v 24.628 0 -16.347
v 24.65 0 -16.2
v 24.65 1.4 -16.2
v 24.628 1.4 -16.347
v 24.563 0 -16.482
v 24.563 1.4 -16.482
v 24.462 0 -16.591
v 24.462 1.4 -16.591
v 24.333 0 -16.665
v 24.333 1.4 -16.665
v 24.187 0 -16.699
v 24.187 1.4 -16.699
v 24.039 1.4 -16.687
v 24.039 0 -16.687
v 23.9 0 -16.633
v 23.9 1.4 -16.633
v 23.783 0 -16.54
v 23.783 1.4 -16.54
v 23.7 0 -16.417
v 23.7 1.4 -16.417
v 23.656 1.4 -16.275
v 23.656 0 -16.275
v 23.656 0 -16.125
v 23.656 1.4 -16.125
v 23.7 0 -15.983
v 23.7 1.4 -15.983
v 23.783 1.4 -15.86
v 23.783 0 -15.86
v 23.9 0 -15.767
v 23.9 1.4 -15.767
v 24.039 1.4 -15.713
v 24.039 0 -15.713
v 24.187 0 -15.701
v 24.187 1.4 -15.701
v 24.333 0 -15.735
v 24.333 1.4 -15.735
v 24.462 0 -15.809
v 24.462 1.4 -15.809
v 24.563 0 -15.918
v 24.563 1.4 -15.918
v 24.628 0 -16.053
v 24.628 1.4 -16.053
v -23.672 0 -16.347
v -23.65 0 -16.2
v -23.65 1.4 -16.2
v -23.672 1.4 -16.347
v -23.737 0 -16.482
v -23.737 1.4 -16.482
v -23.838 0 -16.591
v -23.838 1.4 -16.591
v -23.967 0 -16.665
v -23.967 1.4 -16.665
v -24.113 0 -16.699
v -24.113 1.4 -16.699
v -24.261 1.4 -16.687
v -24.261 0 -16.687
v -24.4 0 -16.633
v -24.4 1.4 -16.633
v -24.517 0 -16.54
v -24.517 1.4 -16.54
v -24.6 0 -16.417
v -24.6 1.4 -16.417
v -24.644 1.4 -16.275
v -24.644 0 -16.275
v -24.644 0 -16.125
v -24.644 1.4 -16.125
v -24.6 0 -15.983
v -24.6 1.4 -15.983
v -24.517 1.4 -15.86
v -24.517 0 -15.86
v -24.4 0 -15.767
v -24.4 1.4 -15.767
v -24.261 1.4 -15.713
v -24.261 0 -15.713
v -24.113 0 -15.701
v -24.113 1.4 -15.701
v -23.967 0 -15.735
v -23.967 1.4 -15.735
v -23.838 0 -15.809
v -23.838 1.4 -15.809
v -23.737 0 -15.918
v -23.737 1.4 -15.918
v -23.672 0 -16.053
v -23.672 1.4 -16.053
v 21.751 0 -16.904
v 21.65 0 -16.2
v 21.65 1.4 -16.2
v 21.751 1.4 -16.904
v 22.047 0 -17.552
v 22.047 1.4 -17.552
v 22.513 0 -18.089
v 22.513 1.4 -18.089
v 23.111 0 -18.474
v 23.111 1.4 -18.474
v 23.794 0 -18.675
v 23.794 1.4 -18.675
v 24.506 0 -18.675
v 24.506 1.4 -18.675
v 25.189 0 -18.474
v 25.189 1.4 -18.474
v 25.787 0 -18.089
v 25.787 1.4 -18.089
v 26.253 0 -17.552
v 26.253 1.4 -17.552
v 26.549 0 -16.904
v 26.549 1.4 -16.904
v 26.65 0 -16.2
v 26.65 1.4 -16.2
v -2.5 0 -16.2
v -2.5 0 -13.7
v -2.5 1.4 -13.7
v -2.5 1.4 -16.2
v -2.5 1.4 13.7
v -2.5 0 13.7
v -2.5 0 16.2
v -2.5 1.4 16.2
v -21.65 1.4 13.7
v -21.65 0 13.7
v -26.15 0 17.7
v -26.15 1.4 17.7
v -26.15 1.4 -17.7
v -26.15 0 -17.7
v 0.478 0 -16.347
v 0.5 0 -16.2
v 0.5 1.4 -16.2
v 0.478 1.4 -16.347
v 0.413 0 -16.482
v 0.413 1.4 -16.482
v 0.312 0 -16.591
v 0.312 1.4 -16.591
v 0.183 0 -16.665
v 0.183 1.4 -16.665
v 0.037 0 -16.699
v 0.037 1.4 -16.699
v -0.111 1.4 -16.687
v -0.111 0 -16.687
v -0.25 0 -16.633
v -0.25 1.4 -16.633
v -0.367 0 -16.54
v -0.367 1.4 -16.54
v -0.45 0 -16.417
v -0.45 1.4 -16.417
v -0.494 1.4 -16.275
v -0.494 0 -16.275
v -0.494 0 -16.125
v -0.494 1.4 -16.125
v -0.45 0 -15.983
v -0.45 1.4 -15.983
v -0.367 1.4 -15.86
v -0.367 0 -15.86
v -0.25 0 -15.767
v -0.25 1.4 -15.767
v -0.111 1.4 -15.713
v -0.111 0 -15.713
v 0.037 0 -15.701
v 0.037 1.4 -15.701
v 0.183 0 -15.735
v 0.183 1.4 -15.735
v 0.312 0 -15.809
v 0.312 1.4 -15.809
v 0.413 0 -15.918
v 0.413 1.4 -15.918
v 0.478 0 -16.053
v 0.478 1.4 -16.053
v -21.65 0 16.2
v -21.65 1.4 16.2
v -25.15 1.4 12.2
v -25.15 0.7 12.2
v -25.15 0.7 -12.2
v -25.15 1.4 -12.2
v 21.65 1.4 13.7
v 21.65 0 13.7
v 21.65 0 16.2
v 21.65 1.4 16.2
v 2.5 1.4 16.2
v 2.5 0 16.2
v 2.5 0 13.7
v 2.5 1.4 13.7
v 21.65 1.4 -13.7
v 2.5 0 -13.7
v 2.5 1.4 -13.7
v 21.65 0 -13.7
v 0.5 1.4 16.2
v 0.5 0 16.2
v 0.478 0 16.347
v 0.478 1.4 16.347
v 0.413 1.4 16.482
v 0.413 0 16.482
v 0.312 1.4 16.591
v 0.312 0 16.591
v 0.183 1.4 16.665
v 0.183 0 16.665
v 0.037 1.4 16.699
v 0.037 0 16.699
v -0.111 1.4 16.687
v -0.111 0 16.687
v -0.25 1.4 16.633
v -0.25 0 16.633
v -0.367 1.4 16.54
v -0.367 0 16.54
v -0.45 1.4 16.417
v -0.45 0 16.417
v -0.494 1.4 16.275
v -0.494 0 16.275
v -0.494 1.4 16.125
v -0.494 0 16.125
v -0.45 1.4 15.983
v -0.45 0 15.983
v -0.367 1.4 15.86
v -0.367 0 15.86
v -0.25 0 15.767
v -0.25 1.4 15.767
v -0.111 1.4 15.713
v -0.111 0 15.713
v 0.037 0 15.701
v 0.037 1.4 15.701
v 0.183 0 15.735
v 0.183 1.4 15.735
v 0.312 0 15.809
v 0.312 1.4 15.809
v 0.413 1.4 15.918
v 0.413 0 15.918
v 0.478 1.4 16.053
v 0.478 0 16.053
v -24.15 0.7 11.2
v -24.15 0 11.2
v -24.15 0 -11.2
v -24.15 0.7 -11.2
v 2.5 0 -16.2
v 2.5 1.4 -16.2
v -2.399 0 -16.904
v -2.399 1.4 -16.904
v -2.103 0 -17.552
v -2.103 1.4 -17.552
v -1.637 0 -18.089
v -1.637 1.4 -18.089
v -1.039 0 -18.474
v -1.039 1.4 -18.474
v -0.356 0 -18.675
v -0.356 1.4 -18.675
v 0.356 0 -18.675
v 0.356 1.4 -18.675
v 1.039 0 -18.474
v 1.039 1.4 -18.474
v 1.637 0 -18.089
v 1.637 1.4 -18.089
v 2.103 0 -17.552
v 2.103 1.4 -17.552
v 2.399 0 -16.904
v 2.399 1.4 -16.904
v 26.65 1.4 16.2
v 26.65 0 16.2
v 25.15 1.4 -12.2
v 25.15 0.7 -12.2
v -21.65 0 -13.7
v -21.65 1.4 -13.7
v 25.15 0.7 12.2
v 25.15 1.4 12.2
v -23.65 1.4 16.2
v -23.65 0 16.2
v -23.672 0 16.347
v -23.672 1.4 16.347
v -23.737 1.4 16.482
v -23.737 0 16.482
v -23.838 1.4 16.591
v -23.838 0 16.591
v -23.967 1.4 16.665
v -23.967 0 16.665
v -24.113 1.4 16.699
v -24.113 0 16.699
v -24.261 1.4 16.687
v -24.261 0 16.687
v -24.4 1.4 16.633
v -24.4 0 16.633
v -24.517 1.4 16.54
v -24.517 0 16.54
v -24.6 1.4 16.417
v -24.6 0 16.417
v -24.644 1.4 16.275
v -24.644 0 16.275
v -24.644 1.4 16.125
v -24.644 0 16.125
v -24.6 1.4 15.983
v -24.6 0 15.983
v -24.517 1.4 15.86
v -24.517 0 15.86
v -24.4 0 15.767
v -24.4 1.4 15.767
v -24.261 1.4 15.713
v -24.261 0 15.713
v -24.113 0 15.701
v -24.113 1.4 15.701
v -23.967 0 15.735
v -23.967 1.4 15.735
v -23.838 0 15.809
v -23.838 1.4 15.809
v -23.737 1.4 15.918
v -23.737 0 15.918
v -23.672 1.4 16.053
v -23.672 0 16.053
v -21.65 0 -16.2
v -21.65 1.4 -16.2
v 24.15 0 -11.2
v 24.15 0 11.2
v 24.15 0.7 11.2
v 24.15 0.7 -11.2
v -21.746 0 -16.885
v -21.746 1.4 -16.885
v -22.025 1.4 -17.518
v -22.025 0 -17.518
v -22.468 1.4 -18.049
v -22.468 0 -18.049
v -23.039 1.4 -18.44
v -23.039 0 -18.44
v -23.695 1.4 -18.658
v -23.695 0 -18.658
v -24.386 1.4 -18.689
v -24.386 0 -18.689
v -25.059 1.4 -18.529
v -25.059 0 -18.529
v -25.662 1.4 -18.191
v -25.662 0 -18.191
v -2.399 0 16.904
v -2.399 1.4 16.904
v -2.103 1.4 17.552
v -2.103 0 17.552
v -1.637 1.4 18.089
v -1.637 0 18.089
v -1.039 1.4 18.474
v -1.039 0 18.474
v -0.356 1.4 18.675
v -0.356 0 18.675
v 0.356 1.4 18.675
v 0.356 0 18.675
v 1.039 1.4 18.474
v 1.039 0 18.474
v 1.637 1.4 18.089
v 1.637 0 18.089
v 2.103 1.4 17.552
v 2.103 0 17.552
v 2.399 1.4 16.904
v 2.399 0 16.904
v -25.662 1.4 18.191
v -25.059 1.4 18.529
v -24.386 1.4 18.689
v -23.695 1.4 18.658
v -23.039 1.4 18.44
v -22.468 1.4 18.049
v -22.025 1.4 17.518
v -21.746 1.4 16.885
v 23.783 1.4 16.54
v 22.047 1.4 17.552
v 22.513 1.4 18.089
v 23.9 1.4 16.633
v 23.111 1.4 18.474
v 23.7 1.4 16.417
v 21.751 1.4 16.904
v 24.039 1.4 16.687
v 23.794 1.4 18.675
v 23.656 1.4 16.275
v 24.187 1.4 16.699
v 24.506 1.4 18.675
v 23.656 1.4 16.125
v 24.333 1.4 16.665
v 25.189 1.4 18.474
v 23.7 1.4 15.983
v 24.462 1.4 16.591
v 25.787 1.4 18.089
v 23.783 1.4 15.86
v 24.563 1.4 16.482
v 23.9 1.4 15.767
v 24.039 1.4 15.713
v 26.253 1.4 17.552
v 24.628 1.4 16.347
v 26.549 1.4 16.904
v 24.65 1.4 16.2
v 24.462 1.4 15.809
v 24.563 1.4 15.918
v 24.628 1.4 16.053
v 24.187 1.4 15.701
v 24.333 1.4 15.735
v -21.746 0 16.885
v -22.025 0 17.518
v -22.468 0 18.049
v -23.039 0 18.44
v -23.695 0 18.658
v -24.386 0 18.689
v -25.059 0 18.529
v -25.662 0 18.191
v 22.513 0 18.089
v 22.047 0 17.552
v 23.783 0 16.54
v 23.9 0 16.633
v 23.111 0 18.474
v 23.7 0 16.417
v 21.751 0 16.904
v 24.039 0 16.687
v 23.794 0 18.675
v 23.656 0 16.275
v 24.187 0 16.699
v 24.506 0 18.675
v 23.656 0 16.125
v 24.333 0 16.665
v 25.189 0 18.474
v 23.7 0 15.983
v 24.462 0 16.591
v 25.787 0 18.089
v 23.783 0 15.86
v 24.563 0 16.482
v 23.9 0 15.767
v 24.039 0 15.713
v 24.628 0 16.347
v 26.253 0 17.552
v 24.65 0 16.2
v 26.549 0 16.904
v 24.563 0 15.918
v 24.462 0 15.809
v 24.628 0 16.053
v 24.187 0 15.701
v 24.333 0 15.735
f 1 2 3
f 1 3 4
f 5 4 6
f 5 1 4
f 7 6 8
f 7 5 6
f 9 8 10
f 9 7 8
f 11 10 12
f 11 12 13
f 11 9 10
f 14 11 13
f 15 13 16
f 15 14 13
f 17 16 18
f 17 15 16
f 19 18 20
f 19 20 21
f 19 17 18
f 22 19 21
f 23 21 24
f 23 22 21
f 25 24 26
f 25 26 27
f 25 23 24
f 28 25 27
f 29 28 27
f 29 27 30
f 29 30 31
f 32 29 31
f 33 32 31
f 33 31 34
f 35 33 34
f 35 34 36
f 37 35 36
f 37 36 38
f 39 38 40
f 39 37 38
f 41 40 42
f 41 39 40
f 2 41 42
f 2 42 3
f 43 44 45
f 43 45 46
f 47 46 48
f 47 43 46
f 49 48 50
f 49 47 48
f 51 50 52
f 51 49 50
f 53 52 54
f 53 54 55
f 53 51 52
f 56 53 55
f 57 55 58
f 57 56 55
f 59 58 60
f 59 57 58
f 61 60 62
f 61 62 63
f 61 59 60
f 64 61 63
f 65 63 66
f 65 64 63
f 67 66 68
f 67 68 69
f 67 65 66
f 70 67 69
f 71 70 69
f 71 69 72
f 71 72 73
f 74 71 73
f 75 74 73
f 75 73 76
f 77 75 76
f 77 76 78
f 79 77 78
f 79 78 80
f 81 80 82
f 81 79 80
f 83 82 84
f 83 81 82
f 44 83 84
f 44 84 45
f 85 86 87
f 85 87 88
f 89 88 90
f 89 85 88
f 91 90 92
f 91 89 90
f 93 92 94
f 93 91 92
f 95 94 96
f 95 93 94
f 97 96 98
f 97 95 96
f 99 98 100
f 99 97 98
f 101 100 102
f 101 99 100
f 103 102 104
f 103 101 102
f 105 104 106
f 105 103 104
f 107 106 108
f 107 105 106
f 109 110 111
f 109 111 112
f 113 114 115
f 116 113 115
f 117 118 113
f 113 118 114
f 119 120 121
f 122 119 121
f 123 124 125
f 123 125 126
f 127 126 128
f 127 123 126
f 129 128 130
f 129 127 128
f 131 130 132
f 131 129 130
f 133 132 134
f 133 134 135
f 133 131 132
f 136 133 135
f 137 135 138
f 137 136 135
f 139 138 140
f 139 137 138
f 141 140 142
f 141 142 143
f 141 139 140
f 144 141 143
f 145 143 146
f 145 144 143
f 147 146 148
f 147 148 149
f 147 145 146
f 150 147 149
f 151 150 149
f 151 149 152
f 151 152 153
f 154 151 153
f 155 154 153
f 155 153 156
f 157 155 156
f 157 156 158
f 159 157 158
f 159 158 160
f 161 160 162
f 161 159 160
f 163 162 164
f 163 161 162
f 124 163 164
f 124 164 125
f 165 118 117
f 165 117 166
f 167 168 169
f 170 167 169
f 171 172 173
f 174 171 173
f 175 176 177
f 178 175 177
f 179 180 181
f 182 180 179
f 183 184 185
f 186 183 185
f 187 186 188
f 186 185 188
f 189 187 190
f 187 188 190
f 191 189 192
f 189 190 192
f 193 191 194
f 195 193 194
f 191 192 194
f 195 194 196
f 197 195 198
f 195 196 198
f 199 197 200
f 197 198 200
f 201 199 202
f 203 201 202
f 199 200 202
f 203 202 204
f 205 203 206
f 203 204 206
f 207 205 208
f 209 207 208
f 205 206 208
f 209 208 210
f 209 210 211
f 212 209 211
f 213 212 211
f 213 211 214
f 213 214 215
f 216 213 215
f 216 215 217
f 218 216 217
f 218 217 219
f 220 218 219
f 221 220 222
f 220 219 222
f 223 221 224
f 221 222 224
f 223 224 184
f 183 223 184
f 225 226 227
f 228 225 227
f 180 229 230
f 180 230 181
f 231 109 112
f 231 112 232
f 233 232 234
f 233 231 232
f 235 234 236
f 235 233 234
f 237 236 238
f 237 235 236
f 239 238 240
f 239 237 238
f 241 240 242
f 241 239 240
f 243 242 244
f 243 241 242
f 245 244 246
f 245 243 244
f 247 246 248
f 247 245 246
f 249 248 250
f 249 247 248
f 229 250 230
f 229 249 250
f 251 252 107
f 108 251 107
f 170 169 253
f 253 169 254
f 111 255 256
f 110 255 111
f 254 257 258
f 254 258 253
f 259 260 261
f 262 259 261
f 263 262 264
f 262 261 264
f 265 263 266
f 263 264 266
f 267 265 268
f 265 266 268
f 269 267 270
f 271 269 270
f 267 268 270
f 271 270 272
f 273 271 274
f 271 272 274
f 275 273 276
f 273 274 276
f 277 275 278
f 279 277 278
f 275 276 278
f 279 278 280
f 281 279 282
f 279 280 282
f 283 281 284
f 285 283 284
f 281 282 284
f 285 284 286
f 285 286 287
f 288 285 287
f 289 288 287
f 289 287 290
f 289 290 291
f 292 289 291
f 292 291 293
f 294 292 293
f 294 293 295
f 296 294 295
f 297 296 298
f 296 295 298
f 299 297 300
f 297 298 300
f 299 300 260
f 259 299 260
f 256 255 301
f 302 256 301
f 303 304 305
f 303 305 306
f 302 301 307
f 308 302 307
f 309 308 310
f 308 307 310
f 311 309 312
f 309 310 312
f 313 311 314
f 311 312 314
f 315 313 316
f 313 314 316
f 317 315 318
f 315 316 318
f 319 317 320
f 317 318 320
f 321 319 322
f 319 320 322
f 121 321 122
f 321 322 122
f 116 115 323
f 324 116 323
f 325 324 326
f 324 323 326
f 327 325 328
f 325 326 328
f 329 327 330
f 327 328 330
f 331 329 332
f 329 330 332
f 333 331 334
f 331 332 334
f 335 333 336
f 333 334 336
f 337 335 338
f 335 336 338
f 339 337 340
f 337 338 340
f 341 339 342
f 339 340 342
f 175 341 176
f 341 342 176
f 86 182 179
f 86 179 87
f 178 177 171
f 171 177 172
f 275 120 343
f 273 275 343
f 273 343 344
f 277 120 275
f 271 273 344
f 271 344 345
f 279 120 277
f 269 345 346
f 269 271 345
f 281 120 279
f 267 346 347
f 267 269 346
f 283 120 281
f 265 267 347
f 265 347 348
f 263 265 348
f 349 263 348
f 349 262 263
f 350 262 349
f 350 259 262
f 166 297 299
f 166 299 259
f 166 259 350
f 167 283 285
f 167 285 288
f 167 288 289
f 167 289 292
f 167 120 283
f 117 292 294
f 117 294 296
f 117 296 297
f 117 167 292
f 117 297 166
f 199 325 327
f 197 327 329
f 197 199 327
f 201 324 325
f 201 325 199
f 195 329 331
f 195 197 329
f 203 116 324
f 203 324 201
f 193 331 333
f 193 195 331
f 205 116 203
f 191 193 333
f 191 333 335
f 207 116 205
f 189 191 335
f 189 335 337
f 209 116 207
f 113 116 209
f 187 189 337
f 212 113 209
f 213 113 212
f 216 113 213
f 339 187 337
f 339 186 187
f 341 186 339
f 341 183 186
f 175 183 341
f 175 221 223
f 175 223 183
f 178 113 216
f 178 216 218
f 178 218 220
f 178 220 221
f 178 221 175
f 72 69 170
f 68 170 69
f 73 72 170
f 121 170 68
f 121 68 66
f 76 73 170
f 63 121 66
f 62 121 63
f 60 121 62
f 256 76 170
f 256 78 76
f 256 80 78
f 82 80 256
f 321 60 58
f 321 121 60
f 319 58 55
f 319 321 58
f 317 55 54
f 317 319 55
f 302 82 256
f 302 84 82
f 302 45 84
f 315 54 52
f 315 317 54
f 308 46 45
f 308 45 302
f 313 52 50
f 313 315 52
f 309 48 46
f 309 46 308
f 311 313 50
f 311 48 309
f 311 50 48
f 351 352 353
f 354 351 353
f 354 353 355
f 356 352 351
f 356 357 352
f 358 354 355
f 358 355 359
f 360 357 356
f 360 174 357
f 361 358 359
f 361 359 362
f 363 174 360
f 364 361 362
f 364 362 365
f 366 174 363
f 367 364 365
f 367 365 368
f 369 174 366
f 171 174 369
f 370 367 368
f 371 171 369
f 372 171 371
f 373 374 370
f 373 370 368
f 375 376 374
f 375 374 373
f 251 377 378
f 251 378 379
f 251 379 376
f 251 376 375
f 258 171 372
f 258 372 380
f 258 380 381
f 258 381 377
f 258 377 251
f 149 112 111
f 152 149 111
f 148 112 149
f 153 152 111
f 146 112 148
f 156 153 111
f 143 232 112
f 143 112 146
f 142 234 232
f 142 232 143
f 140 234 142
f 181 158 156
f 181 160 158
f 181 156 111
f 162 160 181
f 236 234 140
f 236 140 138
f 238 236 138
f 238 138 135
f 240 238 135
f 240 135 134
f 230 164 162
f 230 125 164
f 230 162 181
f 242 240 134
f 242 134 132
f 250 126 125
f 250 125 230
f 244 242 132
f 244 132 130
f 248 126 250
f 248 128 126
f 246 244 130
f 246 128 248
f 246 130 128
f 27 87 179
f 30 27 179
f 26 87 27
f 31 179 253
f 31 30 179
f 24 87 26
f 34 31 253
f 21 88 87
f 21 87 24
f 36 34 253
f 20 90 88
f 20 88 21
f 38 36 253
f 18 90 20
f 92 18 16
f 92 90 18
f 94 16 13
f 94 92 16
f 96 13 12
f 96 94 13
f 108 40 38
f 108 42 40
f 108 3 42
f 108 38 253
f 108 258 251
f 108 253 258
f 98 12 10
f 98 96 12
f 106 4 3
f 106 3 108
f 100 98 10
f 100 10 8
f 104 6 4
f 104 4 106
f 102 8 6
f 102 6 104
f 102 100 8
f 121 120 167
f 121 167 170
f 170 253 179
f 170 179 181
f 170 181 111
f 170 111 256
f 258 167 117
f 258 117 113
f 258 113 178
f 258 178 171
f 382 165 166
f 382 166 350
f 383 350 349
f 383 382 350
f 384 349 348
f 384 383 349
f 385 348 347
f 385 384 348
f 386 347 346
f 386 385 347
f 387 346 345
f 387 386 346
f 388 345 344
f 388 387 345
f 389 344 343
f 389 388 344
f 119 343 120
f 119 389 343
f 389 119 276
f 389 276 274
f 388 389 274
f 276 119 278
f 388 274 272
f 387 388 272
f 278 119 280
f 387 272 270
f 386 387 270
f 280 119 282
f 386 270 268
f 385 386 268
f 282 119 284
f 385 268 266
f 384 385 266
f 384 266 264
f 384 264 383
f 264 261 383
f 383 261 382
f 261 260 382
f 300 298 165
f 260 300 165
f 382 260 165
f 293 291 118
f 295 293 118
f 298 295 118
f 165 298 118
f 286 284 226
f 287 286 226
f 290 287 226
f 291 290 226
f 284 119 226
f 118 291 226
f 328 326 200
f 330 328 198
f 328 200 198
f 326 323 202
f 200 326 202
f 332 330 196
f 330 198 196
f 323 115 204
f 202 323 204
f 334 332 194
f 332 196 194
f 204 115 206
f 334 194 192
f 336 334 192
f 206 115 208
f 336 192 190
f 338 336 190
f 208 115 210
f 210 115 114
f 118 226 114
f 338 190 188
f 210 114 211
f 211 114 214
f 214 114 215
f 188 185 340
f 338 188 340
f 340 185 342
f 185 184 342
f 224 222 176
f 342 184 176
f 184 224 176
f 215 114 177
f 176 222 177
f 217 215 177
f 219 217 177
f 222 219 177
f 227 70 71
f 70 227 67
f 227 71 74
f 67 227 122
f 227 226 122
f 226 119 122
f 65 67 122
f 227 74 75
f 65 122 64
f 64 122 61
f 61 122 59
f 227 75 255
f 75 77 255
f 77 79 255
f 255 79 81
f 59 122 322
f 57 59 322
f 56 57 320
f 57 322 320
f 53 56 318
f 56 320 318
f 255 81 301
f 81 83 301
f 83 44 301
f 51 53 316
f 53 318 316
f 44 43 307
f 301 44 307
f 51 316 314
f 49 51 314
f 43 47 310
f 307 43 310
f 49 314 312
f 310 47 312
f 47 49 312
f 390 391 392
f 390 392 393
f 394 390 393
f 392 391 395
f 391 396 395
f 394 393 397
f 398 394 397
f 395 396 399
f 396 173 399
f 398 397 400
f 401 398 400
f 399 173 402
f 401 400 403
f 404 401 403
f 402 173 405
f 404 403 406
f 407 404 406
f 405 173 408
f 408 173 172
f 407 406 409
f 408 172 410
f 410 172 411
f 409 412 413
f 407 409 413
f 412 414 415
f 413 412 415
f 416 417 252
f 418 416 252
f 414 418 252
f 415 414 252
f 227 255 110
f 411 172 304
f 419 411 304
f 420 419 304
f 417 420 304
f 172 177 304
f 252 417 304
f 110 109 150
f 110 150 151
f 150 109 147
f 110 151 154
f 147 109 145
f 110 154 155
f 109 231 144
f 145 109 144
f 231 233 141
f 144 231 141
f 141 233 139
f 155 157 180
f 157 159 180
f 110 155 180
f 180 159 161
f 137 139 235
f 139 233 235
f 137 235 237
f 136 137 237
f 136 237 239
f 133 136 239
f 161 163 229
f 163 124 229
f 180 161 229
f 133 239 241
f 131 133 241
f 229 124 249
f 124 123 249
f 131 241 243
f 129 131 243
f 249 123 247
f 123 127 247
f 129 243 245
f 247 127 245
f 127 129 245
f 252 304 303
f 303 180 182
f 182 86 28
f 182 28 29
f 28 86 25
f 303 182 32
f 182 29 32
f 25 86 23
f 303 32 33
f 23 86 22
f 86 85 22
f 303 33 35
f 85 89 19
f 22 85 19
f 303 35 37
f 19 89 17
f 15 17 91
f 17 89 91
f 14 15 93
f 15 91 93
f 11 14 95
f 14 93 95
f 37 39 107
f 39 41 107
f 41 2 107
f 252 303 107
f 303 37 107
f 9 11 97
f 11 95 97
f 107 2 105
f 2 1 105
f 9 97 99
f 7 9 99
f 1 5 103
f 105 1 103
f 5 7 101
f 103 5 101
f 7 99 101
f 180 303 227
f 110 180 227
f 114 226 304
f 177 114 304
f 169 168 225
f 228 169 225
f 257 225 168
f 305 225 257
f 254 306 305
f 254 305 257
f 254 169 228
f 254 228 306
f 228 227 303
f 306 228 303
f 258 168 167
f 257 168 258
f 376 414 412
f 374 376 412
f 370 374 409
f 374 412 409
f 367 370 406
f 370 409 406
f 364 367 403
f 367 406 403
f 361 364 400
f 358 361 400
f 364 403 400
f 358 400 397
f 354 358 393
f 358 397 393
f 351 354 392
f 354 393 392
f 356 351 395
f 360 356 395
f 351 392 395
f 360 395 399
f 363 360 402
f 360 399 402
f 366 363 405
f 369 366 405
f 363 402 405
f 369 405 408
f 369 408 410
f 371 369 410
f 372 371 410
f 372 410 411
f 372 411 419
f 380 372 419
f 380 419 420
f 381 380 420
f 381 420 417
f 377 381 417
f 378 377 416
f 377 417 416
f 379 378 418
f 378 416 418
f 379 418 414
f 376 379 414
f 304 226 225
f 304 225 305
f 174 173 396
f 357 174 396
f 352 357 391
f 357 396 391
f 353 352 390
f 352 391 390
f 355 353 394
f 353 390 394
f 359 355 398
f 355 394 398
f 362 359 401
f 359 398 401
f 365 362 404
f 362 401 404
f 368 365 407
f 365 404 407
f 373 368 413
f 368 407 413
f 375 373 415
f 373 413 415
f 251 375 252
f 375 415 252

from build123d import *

# Parameters (mm, degrees)
SKETCH1_W               = 53.3
SKETCH1_H               = 27.4
SKETCH1_W_2             = 48.3
SKETCH1_H_2             = 22.4
BOSS_EXTRUDE1_DEPTH     = 0.7
SKETCH2_W               = 53.3
SKETCH2_H               = 27.4
SKETCH2_W_2             = 50.3
SKETCH2_H_2             = 24.4
BOSS_EXTRUDE2_DEPTH     = 0.7
SKETCH3_R               = 0.5
BOSS_EXTRUDE3_DEPTH     = 1.4
SKETCH5_W               = 13.547692857
SKETCH5_H               = 47.955685723
CUT_EXTRUDE1_DEPTH      = 1
CUT_EXTRUDE1_DEPTH_BACK = 2.4


with BuildPart() as part:
    # Sketch1 → Boss-Extrude1 (new body)
    with BuildSketch(Plane(origin=(0, 0, 0), x_dir=(1, 0, 0), z_dir=(0, 1, 0))):
        Rectangle(SKETCH1_W, SKETCH1_H)
        Rectangle(SKETCH1_W_2, SKETCH1_H_2, mode=Mode.SUBTRACT)
    extrude(amount=BOSS_EXTRUDE1_DEPTH)

    # Sketch2 → Boss-Extrude2 (add)
    with BuildSketch(Plane(origin=(0, 0.7, 0), x_dir=(1, 0, 0), z_dir=(0, 1, 0))):
        Rectangle(SKETCH2_W, SKETCH2_H)
        Rectangle(SKETCH2_W_2, SKETCH2_H_2, mode=Mode.SUBTRACT)
    extrude(amount=BOSS_EXTRUDE2_DEPTH)

    # Sketch3 → Boss-Extrude3 (add)
    with BuildSketch(Plane.XZ):
        with BuildLine():
            Line((-26.65, 13.7), (-21.65, 13.7))
            Line((-21.65, 13.7), (-21.65, 16.2))
            ThreePointArc((-21.65, 16.2), (-24.15, 18.7), (-26.65, 16.2))
            Line((-26.65, 16.2), (-26.65, 13.7))
        make_face()
        with Locations((-24.15, 16.2)):
            Circle(SKETCH3_R, mode=Mode.SUBTRACT)
        with BuildLine():
            Line((26.65, 16.2), (26.65, 13.7))
            Line((26.65, 13.7), (21.65, 13.7))
            Line((21.65, 13.7), (21.65, 16.2))
            ThreePointArc((21.65, 16.2), (24.15, 18.7), (26.65, 16.2))
        make_face()
        with Locations((24.15, 16.2)):
            Circle(SKETCH3_R, mode=Mode.SUBTRACT)
        with BuildLine():
            Line((2.5, 16.2), (2.5, 13.7))
            Line((2.5, 13.7), (-2.5, 13.7))
            Line((-2.5, 13.7), (-2.5, 16.2))
            ThreePointArc((-2.5, 16.2), (0, 18.7), (2.5, 16.2))
        make_face()
        with Locations((0, 16.2)):
            Circle(SKETCH3_R, mode=Mode.SUBTRACT)
    boss_extrude3 = extrude(amount=-BOSS_EXTRUDE3_DEPTH)

    # Mirror1: Boss-Extrude3 across plane
    add(boss_extrude3.mirror(Plane.XY))

    # Sketch5 → Cut-Extrude1 (cut, two sides)
    with BuildSketch(Plane(origin=(0, 1.4, 0), x_dir=(1, 0, 0), z_dir=(0, 1, 0))) as cut_extrude1_sk:
        with Locations((-32.923846428, 2.960560152)):
            Rectangle(SKETCH5_W, SKETCH5_H)
    extrude(amount=CUT_EXTRUDE1_DEPTH, mode=Mode.SUBTRACT)
    extrude(cut_extrude1_sk.sketch, amount=-CUT_EXTRUDE1_DEPTH_BACK, mode=Mode.SUBTRACT)


solid = part.part
